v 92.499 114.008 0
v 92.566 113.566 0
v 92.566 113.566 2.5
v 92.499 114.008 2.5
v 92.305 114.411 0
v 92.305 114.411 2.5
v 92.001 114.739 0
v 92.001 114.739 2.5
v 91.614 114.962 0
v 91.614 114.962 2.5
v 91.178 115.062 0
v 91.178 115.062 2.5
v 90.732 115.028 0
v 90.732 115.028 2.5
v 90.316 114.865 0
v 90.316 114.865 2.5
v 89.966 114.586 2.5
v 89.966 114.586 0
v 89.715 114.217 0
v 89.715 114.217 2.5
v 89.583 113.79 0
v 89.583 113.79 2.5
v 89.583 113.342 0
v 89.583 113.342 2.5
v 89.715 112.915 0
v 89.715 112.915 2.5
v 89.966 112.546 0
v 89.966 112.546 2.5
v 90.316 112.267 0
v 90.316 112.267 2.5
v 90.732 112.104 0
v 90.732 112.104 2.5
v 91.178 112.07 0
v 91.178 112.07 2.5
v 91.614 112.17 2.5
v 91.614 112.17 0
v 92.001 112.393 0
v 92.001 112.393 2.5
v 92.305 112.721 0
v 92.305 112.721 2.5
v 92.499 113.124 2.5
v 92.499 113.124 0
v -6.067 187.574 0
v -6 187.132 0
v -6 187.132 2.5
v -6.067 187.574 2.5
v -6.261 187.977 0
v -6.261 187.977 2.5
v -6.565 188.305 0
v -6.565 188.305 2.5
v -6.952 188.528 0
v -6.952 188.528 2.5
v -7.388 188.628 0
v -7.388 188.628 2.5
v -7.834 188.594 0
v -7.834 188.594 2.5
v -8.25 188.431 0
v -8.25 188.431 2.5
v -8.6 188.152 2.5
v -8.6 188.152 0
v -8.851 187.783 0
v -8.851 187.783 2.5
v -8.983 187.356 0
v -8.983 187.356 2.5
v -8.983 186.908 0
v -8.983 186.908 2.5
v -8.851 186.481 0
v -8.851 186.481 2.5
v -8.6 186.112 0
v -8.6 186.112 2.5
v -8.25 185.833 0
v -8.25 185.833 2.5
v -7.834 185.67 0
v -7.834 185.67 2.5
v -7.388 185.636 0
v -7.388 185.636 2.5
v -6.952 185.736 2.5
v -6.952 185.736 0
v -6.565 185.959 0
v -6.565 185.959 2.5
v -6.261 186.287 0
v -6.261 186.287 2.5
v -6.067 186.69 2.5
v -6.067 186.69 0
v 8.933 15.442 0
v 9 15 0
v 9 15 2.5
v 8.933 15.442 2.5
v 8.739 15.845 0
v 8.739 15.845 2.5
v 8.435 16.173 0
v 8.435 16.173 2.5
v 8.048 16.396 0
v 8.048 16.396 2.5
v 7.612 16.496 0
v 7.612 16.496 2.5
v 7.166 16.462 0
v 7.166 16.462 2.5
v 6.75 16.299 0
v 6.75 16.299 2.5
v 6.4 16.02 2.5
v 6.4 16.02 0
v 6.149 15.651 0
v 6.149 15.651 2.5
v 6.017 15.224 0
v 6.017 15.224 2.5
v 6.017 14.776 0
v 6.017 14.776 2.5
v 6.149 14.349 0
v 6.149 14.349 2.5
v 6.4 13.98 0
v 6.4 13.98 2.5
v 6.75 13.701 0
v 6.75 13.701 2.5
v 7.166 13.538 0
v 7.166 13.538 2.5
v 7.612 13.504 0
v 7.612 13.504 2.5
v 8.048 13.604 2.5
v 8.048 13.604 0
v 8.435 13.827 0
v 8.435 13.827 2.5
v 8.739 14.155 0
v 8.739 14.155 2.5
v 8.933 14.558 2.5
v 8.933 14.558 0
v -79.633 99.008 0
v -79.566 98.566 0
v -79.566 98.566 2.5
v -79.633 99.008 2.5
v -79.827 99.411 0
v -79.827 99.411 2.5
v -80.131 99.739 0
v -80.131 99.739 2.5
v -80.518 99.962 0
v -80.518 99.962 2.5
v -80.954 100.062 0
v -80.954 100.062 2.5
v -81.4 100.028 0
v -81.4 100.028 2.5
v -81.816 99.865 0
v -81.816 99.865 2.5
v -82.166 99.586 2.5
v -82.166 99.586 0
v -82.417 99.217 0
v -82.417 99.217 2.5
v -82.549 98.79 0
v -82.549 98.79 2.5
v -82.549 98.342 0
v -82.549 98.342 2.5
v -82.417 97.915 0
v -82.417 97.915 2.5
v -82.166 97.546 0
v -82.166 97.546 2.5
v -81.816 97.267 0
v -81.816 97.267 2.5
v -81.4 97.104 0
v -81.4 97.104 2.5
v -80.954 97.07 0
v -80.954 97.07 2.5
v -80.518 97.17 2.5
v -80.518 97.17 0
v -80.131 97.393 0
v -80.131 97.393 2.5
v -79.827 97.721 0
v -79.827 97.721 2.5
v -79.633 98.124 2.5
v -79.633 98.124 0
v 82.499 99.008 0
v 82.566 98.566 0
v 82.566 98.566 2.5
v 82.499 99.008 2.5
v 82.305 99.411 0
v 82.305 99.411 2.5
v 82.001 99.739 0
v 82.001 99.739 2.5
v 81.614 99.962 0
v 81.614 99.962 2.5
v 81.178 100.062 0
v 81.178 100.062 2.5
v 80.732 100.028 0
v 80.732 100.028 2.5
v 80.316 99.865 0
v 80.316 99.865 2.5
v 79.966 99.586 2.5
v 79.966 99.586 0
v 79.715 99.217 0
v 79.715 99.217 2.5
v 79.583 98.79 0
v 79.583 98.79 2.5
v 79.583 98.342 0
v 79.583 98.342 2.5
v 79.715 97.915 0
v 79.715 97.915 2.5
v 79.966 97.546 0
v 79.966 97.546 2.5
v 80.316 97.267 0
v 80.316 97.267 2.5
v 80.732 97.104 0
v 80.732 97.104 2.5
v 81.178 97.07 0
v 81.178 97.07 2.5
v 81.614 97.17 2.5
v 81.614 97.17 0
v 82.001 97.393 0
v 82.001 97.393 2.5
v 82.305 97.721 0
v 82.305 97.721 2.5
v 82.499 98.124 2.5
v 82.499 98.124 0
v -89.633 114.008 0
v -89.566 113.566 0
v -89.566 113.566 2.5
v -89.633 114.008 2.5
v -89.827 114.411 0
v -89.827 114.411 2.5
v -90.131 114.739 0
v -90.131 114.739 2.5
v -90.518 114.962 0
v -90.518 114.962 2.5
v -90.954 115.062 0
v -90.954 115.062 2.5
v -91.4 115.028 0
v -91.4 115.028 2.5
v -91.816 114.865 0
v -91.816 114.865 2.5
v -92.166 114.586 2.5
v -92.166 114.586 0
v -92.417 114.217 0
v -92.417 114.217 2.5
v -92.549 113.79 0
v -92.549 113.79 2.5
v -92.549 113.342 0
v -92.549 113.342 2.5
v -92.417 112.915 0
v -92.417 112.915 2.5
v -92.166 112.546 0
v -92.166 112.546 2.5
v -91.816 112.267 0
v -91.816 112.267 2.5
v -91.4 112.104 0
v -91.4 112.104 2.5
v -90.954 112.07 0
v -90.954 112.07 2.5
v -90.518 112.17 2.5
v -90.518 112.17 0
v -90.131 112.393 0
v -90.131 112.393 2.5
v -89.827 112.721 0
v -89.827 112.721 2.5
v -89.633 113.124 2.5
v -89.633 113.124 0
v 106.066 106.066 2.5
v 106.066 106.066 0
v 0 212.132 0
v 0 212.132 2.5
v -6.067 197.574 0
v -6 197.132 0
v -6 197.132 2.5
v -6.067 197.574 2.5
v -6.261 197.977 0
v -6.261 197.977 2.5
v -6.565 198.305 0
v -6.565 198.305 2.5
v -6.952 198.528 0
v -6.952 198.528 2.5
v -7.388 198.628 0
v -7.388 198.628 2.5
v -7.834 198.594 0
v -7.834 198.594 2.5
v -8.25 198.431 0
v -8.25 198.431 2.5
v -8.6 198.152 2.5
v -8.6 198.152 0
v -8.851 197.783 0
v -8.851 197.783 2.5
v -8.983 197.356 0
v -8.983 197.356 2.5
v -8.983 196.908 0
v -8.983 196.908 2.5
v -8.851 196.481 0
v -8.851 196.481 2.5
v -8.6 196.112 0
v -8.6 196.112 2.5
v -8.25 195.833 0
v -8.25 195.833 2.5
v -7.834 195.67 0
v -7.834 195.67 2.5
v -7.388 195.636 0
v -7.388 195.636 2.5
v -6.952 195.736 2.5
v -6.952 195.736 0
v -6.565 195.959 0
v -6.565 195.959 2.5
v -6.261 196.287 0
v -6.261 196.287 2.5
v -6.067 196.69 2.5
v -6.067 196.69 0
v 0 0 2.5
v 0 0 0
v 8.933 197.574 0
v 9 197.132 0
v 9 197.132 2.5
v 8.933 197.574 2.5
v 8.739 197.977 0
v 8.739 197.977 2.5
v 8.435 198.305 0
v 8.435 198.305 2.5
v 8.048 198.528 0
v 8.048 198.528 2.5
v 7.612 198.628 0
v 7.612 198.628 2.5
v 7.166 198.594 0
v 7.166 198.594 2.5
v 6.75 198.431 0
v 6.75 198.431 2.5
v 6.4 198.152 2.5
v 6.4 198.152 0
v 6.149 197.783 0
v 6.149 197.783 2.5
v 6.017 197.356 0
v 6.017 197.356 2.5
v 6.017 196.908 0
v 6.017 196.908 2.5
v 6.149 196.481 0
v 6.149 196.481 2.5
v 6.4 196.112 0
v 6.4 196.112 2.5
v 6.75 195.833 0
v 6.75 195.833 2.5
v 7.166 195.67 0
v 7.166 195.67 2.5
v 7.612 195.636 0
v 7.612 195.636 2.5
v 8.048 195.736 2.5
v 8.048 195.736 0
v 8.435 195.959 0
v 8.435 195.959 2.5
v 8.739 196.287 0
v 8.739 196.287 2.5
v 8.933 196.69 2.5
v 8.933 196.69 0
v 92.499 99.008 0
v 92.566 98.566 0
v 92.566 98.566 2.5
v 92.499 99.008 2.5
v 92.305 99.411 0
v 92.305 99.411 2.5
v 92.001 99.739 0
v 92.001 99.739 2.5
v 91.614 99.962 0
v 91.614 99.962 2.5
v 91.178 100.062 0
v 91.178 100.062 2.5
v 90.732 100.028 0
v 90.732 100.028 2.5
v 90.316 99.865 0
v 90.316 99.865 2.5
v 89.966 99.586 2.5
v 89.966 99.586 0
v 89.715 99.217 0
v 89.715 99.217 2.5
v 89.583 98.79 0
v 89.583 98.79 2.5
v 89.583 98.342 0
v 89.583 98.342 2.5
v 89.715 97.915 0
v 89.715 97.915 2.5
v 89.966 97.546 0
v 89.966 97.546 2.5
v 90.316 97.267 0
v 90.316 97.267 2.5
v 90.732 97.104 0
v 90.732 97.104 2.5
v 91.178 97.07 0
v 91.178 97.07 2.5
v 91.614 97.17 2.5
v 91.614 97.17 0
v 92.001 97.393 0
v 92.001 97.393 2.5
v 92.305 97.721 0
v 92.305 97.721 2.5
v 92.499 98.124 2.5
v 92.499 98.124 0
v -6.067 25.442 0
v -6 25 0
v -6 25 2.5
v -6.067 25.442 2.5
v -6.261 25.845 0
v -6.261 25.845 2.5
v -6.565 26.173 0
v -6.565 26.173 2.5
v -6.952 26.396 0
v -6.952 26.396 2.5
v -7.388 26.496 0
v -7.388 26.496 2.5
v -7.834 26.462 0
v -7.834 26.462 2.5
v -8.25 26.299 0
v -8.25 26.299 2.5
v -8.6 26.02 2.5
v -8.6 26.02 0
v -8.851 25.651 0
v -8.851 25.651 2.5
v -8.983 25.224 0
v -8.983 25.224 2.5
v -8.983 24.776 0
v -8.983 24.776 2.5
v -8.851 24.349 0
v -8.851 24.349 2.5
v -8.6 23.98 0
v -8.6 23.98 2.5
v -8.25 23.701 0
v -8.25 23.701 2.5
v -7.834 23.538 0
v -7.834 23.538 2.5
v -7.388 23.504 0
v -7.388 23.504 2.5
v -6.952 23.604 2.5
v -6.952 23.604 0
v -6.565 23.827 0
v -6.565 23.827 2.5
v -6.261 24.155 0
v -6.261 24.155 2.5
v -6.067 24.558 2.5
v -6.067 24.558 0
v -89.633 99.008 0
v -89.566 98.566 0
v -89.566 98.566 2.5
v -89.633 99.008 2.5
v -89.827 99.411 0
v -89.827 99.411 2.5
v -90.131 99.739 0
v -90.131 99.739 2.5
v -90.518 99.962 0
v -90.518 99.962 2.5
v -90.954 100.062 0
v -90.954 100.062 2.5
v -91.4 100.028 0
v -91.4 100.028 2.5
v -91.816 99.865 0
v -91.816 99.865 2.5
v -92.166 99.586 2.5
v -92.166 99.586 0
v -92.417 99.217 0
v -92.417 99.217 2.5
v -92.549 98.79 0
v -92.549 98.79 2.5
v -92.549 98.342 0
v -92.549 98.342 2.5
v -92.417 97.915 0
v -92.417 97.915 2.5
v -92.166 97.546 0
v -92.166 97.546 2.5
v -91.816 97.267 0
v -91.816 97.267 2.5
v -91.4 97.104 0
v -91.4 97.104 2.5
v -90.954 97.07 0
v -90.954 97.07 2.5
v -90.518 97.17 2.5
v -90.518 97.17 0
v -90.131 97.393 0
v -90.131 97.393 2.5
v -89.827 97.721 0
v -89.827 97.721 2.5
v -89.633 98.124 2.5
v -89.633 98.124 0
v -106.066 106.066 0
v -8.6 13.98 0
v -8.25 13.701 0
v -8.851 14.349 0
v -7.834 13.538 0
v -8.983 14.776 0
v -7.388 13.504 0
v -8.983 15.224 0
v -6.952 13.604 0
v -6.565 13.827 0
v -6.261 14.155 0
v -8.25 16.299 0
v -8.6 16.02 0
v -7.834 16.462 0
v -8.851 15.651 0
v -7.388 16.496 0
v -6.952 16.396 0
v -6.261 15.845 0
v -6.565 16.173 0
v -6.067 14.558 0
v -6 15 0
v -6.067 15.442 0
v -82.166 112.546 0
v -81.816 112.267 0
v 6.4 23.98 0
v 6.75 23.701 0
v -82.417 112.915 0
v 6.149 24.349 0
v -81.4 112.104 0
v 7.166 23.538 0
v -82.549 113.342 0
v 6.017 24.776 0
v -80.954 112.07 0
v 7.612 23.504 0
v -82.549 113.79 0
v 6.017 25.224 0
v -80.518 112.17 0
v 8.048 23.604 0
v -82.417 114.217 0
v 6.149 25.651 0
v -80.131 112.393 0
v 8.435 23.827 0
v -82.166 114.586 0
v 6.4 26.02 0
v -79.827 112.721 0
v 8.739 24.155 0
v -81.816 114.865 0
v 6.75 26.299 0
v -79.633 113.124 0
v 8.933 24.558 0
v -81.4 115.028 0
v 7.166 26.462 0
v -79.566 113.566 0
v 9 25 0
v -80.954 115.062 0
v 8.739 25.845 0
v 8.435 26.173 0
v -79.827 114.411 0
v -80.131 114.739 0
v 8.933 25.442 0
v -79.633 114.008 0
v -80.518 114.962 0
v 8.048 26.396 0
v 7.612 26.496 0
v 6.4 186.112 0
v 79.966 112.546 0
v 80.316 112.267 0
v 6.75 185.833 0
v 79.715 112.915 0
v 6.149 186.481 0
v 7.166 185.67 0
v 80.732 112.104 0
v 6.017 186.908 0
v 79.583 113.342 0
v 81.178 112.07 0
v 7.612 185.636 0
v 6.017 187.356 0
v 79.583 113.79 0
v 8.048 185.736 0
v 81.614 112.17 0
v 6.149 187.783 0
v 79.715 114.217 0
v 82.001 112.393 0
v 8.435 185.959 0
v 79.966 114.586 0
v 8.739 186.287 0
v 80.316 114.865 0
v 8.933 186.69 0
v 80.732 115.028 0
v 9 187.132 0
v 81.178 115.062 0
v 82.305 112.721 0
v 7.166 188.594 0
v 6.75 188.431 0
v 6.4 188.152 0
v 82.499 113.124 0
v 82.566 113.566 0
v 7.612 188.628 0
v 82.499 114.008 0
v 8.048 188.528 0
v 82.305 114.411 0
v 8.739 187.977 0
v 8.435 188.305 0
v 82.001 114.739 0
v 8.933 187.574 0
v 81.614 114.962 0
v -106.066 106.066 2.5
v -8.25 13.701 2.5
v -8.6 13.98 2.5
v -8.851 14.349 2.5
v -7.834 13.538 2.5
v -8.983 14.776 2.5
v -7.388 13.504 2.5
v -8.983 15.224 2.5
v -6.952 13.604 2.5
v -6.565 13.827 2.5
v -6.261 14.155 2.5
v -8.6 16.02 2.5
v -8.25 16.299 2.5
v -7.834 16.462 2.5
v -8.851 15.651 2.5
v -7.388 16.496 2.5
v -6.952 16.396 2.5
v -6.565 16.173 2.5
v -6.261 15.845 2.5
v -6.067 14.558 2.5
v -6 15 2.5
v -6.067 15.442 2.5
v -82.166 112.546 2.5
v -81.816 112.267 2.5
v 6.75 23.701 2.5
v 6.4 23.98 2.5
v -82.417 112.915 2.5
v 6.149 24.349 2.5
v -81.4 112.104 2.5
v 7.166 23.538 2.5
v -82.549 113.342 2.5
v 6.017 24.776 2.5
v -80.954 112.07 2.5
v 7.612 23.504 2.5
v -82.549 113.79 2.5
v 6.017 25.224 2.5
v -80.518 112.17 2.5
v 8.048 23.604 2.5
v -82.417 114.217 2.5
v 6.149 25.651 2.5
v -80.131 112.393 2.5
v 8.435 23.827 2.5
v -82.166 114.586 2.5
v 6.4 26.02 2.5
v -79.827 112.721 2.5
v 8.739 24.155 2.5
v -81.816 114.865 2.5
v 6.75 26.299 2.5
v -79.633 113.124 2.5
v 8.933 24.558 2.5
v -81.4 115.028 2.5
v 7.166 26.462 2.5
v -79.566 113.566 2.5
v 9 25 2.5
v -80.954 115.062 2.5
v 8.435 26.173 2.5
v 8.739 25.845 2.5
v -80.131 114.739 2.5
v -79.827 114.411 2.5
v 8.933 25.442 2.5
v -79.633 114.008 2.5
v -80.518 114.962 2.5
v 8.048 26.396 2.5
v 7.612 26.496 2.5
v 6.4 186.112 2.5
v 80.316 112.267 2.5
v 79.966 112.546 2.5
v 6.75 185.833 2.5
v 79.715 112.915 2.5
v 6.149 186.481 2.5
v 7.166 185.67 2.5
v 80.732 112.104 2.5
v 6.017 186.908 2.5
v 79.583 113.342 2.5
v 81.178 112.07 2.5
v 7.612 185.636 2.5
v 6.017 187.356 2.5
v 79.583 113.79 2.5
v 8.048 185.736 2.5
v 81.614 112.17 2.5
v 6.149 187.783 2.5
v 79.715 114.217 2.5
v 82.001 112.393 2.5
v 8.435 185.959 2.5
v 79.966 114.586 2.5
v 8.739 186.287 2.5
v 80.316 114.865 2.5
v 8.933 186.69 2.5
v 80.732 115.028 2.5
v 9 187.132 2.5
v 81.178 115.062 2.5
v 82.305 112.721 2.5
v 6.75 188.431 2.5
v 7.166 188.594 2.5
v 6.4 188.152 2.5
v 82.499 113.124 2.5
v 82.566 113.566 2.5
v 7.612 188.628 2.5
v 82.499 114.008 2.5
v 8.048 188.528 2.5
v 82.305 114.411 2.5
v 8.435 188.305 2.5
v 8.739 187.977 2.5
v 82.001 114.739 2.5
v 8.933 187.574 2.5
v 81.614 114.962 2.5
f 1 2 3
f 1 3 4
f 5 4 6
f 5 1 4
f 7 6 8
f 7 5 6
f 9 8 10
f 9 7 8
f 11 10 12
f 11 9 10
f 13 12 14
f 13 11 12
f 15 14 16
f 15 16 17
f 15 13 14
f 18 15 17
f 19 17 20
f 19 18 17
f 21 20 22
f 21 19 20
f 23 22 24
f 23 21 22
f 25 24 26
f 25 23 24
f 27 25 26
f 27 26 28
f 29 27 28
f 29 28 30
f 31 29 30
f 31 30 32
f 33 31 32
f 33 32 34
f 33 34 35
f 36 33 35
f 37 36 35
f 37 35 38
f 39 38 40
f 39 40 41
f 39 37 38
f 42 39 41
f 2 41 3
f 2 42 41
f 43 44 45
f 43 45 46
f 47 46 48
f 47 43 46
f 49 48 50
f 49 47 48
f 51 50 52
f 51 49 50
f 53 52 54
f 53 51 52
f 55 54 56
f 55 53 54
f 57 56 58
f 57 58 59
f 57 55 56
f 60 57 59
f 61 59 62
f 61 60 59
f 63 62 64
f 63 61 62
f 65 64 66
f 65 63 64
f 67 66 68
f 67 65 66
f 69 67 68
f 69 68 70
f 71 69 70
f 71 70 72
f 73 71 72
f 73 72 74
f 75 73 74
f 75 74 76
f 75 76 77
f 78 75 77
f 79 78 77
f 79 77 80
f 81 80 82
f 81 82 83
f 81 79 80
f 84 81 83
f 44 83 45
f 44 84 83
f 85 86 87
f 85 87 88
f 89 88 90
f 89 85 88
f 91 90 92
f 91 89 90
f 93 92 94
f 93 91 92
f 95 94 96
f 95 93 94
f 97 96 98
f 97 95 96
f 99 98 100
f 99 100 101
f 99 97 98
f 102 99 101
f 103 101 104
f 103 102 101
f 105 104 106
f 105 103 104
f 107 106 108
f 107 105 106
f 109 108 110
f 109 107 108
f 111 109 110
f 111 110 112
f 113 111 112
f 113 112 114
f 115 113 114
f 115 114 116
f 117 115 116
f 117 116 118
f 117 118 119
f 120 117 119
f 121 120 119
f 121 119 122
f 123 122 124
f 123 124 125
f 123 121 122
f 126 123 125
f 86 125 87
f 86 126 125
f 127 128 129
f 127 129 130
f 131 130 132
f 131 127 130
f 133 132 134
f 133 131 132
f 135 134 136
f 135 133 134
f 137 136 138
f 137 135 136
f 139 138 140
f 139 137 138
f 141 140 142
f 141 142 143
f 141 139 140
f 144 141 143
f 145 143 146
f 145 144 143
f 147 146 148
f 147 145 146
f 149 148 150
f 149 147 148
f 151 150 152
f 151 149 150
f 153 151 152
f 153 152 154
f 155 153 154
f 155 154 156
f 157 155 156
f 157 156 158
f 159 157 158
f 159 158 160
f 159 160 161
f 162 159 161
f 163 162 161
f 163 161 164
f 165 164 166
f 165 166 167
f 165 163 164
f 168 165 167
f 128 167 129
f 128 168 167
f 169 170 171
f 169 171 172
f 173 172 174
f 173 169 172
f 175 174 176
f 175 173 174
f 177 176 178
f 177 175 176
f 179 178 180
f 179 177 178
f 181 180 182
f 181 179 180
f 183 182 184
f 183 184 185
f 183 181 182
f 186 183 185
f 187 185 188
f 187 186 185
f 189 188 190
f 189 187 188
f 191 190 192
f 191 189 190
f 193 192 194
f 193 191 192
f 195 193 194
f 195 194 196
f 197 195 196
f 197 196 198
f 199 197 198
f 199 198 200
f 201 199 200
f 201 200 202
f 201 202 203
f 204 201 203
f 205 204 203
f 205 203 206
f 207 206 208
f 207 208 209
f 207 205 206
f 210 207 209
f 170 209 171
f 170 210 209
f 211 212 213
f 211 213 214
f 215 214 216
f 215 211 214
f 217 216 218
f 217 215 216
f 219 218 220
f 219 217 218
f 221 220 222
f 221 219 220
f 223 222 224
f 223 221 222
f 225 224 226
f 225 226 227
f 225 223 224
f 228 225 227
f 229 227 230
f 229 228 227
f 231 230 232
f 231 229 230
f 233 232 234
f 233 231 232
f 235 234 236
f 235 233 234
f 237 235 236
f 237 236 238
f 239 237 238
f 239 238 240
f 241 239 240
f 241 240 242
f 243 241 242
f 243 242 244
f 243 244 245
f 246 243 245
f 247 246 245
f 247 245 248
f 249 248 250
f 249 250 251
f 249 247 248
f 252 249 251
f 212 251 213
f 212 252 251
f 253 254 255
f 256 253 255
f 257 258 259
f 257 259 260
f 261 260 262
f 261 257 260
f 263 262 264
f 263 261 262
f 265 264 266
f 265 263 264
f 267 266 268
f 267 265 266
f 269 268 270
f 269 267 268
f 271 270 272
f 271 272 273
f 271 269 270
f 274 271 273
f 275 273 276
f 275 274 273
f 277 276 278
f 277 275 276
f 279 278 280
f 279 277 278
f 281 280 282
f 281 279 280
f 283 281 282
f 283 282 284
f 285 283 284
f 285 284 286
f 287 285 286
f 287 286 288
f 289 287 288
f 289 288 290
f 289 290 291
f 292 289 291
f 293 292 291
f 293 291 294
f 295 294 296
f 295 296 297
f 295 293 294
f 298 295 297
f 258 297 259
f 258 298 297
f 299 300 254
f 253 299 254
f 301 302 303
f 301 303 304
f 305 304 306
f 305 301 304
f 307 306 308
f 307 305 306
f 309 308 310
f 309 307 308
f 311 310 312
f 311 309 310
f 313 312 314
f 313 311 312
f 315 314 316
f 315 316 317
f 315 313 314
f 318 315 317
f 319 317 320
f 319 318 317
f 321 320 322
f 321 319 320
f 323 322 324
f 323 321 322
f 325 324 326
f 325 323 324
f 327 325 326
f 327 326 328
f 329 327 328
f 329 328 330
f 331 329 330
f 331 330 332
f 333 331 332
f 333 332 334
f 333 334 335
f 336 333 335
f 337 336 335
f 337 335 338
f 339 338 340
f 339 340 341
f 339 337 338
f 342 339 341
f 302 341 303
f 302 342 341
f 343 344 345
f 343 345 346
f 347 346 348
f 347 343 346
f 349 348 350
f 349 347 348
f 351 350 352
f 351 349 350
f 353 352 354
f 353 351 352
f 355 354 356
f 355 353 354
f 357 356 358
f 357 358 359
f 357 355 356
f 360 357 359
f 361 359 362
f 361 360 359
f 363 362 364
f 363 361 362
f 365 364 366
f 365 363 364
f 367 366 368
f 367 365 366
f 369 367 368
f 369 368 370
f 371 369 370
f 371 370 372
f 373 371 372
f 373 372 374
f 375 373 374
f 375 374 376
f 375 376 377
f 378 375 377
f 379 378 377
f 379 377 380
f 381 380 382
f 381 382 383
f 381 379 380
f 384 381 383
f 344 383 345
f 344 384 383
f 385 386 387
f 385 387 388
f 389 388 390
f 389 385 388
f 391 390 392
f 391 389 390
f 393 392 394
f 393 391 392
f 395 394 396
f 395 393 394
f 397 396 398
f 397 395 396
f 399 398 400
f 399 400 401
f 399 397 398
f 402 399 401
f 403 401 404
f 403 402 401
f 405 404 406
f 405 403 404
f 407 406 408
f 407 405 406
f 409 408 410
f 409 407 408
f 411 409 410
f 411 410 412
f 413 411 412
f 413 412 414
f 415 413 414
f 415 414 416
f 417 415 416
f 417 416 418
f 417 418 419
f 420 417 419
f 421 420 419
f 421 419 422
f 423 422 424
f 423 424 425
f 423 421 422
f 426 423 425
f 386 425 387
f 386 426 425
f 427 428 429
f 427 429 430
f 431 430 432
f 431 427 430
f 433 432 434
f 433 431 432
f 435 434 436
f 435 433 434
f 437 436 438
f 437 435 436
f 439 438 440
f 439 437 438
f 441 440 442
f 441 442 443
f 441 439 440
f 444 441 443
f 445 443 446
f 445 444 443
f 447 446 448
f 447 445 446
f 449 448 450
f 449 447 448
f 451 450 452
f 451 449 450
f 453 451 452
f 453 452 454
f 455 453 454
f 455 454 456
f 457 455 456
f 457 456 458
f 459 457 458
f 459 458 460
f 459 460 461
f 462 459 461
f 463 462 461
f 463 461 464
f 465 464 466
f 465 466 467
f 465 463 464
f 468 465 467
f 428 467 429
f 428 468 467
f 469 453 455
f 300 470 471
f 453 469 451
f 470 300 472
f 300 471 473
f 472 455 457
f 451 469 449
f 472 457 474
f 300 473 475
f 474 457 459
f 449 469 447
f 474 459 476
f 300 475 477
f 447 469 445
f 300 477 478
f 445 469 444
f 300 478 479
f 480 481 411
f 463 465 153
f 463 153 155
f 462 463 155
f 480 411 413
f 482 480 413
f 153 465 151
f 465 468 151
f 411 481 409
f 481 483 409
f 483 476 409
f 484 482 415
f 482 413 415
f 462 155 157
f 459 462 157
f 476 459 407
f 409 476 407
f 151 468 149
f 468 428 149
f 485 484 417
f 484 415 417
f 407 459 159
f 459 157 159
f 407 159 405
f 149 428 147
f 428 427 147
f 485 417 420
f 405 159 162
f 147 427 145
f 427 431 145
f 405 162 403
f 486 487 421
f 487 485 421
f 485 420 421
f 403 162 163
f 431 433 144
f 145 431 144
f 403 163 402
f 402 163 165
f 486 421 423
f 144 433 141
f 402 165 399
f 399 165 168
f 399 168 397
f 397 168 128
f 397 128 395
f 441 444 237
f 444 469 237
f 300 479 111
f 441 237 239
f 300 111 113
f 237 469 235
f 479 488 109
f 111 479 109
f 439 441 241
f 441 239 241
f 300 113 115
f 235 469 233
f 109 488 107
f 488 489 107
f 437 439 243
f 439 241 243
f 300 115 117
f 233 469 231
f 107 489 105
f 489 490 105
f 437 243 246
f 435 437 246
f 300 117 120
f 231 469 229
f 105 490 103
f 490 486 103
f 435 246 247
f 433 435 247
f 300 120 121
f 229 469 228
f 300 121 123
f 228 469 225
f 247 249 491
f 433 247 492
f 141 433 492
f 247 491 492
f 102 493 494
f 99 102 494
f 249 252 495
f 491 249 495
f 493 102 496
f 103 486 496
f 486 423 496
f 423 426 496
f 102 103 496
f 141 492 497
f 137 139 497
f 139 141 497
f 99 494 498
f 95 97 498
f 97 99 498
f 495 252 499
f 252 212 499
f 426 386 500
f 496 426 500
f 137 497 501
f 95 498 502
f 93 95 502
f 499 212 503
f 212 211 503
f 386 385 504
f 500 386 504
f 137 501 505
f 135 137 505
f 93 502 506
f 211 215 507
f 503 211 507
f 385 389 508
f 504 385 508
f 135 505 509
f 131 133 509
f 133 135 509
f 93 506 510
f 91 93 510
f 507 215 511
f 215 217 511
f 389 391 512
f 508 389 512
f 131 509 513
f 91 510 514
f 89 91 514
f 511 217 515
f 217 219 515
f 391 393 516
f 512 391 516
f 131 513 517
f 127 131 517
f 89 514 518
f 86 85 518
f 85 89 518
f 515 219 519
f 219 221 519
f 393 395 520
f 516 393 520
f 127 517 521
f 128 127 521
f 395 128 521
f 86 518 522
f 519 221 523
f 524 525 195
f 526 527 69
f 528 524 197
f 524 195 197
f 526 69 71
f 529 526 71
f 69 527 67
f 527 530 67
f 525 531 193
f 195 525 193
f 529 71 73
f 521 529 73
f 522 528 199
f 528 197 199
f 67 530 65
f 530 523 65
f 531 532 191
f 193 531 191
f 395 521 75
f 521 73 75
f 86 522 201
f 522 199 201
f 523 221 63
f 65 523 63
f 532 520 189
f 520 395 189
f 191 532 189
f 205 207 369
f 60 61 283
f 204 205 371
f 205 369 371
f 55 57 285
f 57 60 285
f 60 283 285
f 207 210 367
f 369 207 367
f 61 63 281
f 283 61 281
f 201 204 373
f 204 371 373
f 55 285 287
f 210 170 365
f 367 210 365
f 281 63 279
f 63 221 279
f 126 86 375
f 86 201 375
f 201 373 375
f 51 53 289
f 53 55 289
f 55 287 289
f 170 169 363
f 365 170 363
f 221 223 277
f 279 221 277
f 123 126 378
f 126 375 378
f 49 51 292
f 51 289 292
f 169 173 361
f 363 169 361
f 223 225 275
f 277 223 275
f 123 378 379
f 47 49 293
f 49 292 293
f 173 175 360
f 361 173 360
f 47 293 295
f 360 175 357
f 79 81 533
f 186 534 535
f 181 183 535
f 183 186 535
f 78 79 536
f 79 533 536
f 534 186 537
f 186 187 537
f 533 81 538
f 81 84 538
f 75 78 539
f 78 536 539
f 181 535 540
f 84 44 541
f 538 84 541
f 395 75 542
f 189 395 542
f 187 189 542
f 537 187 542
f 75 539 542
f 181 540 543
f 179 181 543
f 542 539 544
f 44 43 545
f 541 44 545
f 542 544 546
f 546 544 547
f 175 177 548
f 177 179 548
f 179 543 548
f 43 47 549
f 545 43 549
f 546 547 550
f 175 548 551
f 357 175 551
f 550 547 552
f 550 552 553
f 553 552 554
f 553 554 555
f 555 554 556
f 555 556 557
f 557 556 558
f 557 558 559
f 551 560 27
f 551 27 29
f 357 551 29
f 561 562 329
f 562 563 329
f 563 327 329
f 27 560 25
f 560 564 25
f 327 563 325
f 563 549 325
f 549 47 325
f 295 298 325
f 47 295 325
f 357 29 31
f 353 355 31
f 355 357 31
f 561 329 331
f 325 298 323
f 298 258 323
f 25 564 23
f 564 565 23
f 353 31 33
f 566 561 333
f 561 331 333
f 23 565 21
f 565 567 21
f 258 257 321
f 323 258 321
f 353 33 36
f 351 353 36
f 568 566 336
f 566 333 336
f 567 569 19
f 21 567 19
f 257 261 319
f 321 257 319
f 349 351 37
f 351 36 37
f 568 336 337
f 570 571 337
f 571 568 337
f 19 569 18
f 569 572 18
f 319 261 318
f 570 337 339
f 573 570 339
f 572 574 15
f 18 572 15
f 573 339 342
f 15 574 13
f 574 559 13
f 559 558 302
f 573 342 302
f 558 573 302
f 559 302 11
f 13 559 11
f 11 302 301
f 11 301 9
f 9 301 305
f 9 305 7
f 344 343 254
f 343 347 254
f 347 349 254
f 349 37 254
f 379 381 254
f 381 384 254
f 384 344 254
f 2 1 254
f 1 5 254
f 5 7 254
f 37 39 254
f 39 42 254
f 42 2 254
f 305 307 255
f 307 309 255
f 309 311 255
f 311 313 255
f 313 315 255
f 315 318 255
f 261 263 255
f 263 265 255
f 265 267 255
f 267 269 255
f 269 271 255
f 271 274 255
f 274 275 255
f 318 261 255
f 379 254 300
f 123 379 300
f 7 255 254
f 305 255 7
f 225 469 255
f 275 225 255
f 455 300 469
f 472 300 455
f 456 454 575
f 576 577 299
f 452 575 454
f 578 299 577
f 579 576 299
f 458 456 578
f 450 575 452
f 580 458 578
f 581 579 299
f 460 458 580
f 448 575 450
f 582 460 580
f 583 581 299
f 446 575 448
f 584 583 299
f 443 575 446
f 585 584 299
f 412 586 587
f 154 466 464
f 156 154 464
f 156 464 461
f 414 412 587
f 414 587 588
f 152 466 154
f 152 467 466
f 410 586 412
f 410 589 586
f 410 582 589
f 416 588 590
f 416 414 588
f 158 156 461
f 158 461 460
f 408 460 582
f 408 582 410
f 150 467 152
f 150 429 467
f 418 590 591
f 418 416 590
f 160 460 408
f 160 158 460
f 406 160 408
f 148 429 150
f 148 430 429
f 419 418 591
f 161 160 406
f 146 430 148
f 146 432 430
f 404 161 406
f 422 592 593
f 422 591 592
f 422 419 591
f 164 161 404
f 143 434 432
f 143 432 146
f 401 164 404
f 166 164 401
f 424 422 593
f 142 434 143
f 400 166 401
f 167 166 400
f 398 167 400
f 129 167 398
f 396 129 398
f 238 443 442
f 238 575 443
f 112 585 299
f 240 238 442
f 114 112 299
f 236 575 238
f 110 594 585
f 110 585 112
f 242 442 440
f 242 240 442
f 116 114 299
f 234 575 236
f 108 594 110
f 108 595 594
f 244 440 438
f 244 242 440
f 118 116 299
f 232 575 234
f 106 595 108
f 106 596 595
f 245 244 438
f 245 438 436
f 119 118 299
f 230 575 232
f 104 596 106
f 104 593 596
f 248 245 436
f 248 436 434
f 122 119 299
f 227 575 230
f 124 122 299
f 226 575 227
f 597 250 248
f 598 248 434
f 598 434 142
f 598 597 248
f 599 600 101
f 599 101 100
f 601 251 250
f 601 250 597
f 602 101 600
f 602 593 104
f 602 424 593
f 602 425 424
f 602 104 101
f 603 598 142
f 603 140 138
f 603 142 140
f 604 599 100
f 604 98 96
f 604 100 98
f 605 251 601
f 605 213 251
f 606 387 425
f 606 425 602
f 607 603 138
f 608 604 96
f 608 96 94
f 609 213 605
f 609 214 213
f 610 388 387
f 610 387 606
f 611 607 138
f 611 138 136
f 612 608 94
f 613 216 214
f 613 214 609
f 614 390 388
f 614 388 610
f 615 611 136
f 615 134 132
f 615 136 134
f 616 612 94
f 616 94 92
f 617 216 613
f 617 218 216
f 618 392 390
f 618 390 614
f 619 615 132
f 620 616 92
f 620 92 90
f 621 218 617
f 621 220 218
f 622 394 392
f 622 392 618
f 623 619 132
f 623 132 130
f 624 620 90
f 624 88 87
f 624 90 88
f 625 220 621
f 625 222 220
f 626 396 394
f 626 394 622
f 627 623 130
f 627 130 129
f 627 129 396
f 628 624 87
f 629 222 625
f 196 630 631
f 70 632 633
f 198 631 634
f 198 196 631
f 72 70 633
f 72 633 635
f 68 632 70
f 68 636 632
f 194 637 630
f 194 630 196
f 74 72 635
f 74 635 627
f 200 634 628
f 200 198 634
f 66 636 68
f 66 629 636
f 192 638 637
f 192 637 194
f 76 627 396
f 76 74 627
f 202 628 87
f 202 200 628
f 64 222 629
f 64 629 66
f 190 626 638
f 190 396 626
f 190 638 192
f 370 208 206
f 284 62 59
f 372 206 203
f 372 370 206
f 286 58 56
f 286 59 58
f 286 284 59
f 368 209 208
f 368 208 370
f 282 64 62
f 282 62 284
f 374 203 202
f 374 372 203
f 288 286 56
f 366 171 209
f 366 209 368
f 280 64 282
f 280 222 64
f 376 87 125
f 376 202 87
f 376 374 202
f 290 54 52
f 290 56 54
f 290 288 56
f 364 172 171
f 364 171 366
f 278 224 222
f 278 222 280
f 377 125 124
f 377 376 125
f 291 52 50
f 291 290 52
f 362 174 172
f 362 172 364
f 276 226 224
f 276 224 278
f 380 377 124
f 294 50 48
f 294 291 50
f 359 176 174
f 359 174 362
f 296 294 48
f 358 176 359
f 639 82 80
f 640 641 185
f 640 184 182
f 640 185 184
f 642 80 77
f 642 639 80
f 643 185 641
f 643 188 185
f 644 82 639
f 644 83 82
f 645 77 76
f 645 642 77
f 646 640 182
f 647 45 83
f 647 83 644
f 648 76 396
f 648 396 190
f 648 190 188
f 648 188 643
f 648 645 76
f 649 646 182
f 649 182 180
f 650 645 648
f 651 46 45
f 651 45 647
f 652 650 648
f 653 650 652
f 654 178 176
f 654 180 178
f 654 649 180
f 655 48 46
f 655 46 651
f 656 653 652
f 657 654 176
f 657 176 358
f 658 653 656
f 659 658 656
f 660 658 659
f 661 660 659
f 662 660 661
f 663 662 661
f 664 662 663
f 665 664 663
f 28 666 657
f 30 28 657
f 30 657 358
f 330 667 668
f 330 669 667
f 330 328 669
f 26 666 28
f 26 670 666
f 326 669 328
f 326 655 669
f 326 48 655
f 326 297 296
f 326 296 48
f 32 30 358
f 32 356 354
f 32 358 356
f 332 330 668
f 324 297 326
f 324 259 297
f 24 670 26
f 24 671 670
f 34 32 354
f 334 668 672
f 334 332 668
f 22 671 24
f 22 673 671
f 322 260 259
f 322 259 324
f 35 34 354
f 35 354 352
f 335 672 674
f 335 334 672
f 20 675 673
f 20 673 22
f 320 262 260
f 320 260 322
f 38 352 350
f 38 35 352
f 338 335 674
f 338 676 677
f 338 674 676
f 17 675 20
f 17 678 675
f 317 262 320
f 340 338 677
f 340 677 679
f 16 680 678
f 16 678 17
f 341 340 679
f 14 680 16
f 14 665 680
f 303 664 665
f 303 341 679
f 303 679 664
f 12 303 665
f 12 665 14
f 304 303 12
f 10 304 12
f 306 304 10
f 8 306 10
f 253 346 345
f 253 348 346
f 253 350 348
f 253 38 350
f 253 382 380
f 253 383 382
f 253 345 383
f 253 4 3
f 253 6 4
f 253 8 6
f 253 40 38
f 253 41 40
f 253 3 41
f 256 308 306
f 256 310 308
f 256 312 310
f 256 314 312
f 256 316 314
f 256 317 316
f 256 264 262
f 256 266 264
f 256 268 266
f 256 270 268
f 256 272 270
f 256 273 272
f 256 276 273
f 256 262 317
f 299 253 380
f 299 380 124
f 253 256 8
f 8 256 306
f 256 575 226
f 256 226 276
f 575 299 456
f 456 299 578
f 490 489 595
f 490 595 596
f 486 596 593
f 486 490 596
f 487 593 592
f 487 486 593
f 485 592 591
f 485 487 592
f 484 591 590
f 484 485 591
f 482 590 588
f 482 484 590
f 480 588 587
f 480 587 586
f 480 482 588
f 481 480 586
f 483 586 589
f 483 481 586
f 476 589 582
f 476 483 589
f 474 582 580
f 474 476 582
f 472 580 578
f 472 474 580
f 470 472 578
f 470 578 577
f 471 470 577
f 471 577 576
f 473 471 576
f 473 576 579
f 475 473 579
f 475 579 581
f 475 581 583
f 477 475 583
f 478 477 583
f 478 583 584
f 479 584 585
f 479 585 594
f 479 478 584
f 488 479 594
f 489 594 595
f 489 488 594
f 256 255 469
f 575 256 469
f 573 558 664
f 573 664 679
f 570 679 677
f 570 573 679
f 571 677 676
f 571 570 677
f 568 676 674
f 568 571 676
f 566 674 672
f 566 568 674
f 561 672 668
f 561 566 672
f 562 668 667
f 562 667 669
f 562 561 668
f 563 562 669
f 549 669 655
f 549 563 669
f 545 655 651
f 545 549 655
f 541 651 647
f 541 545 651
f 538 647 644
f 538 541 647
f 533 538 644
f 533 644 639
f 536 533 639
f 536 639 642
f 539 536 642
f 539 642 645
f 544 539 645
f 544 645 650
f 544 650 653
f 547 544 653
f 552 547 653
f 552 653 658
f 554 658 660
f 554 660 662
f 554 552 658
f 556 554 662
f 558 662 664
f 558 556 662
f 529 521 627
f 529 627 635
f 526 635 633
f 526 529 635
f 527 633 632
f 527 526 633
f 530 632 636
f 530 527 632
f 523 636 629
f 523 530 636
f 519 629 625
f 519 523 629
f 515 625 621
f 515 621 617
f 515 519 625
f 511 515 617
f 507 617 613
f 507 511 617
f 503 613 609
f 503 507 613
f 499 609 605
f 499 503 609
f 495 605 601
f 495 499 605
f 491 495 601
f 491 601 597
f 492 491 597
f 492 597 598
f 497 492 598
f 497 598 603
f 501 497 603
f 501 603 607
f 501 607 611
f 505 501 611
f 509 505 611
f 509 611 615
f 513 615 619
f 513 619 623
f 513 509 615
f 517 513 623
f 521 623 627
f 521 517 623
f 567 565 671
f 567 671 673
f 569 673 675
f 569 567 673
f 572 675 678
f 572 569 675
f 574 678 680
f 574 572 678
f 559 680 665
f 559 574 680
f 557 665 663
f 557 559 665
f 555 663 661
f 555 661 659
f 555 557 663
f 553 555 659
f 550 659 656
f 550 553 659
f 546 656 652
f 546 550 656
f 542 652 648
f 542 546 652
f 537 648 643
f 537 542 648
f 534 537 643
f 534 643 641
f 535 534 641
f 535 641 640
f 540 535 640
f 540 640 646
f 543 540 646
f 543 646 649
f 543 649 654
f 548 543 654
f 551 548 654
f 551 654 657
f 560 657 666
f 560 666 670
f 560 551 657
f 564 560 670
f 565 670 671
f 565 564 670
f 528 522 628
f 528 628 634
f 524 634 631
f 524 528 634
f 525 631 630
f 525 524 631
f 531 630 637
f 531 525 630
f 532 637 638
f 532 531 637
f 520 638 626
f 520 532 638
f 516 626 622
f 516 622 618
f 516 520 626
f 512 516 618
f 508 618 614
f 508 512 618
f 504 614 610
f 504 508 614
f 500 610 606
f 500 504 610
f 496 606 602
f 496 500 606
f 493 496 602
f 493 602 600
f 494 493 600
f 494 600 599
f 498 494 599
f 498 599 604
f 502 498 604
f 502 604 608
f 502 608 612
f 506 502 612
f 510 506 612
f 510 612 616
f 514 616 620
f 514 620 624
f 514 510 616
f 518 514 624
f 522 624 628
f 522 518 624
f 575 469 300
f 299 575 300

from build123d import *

# Parameters (mm, degrees)
SKETCH2_R           = 1.5
BOSS_EXTRUDE1_DEPTH = 2.5


with BuildPart() as part:
    # Sketch2 → Boss-Extrude1 (new body)
    with BuildSketch(Plane.XY):
        Polygon((0, 0), (106.066017178, 106.066017178), (0, 212.132034356), (-106.066017178, 106.066017178), align=None)
        with Locations((-7.5, 197.132034356)):
            Circle(SKETCH2_R, mode=Mode.SUBTRACT)
        with Locations((7.5, 197.132034356)):
            Circle(SKETCH2_R, mode=Mode.SUBTRACT)
        with Locations((-7.5, 187.132034356)):
            Circle(SKETCH2_R, mode=Mode.SUBTRACT)
        with Locations((7.5, 187.132034356)):
            Circle(SKETCH2_R, mode=Mode.SUBTRACT)
        with Locations((81.066019356, 113.566015)):
            Circle(SKETCH2_R, mode=Mode.SUBTRACT)
        with Locations((81.066019356, 98.566015)):
            Circle(SKETCH2_R, mode=Mode.SUBTRACT)
        with Locations((91.066019356, 98.566015)):
            Circle(SKETCH2_R, mode=Mode.SUBTRACT)
        with Locations((91.066019356, 113.566015)):
            Circle(SKETCH2_R, mode=Mode.SUBTRACT)
        with Locations((7.5, 24.999995644)):
            Circle(SKETCH2_R, mode=Mode.SUBTRACT)
        with Locations((-7.5, 24.999995644)):
            Circle(SKETCH2_R, mode=Mode.SUBTRACT)
        with Locations((-7.5, 14.999995644)):
            Circle(SKETCH2_R, mode=Mode.SUBTRACT)
        with Locations((7.5, 14.999995644)):
            Circle(SKETCH2_R, mode=Mode.SUBTRACT)
        with Locations((-81.066019356, 98.566015)):
            Circle(SKETCH2_R, mode=Mode.SUBTRACT)
        with Locations((-81.066019356, 113.566015)):
            Circle(SKETCH2_R, mode=Mode.SUBTRACT)
        with Locations((-91.066019356, 113.566015)):
            Circle(SKETCH2_R, mode=Mode.SUBTRACT)
        with Locations((-91.066019356, 98.566015)):
            Circle(SKETCH2_R, mode=Mode.SUBTRACT)
    extrude(amount=BOSS_EXTRUDE1_DEPTH)


solid = part.part
